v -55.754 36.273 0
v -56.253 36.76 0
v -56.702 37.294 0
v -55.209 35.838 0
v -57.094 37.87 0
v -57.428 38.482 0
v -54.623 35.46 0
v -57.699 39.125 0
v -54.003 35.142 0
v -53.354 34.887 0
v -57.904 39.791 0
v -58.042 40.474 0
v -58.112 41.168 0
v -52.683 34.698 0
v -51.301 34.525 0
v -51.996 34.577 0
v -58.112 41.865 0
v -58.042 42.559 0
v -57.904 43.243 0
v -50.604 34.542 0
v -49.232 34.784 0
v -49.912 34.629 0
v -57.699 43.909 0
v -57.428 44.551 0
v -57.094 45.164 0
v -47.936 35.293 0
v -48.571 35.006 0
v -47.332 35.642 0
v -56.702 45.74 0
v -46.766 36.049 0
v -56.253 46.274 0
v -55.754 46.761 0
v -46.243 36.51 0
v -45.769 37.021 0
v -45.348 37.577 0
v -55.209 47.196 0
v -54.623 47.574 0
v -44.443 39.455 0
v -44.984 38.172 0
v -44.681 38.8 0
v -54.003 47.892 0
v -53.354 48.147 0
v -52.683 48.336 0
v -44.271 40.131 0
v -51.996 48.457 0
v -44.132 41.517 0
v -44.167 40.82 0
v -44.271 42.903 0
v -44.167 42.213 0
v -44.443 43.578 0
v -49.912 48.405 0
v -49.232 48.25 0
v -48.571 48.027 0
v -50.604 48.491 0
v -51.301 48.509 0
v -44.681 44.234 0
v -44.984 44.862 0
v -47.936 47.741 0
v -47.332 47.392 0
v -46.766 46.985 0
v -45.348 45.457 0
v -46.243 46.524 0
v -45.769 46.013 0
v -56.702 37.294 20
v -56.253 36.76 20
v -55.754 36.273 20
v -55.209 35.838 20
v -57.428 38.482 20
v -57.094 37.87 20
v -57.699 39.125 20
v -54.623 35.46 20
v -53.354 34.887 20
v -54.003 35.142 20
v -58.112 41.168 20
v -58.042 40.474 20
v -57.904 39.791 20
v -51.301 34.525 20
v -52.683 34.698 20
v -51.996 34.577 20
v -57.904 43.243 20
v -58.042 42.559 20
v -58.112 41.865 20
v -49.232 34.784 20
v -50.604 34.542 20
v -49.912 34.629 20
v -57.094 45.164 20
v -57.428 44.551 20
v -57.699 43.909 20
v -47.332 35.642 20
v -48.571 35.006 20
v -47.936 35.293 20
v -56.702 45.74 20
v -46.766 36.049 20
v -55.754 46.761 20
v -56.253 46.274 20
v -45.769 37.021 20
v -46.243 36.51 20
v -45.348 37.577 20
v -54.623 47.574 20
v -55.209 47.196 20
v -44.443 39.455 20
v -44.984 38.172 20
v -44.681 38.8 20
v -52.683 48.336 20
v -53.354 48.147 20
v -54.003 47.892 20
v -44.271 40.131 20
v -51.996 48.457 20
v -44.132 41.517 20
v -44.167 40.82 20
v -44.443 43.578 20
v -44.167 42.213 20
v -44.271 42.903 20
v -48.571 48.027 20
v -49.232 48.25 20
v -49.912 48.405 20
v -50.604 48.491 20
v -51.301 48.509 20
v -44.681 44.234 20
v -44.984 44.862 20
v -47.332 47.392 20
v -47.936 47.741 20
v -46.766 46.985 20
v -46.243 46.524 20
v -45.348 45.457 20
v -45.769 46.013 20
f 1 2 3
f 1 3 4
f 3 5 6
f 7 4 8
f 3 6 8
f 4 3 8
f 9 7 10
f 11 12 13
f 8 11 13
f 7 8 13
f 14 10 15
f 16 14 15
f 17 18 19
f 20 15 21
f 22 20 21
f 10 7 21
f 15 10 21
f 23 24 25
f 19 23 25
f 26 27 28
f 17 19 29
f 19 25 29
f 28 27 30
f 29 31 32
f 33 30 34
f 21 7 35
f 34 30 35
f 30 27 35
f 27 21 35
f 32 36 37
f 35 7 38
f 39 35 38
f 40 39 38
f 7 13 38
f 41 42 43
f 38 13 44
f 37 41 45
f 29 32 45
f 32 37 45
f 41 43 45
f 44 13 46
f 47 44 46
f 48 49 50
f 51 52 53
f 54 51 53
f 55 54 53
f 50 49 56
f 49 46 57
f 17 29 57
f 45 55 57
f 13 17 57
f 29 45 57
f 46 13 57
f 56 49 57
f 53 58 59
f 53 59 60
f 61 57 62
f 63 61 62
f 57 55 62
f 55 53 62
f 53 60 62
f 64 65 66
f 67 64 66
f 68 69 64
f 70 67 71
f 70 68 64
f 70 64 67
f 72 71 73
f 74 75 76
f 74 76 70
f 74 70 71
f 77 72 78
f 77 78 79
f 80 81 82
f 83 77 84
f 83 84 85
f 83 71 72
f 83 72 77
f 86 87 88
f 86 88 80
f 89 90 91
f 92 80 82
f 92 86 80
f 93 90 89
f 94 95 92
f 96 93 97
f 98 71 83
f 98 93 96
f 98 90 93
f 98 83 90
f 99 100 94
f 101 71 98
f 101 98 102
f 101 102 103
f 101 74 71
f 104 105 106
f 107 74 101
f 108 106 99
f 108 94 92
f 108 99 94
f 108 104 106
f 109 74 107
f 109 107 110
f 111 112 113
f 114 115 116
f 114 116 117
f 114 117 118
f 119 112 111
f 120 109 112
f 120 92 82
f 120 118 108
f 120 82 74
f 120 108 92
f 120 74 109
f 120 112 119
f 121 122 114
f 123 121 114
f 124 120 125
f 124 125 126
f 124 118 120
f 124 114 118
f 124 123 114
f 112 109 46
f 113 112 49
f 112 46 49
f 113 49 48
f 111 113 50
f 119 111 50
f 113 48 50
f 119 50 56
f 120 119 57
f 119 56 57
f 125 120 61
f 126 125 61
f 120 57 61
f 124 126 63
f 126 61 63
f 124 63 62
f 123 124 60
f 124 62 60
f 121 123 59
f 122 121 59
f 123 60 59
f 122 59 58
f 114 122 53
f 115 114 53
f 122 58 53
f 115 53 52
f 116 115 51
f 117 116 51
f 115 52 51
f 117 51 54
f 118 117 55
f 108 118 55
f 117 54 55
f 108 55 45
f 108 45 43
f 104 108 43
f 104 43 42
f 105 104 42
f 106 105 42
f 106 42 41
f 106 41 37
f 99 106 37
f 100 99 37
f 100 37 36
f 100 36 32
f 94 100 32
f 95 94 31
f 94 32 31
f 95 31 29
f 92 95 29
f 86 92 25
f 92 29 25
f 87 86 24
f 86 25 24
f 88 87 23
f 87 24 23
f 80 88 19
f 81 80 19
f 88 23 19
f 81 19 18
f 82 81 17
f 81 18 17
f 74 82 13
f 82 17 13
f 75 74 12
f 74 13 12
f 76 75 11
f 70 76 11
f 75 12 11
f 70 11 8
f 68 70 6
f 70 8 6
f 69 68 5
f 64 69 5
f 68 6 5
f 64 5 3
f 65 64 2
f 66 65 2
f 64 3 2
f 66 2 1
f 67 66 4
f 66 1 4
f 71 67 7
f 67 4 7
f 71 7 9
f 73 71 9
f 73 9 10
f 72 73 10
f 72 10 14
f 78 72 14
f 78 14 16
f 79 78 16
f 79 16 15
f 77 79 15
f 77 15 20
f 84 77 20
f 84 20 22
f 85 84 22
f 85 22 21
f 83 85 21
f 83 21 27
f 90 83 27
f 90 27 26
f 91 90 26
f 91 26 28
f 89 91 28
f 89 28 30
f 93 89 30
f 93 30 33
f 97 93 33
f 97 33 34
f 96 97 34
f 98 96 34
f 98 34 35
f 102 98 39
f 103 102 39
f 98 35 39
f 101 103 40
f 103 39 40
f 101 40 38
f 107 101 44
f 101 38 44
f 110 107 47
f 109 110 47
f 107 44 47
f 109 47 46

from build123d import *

# Parameters (mm, degrees)
SKETCH1_W             = 128.922622712
SKETCH1_H             = 108.547542538
SKETCH1_W_2           = 124.922622712
SKETCH1_H_2           = 104.547542538
BOSS_EXTRUDE1_DEPTH   = 50
SKETCH2_R             = 48.496570744
BOSS_EXTRUDE2_DEPTH   = 50
SKETCH3_R             = 6.994110628
BOSS_EXTRUDE3_DEPTH   = 20
SKETCH3_R_2           = 6.120691225
BOSS_EXTRUDE3_2_DEPTH = 20


with BuildPart() as part:
    # Sketch1 → Boss-Extrude1 (new body)
    with BuildSketch(Plane.XY):
        Rectangle(SKETCH1_W, SKETCH1_H)
        Rectangle(SKETCH1_W_2, SKETCH1_H_2, mode=Mode.SUBTRACT)
    extrude(amount=BOSS_EXTRUDE1_DEPTH)


with BuildPart() as body_2:
    # Sketch2 → Boss-Extrude2 (new body)
    with BuildSketch(Plane.XY):
        with Locations(Location((0, 0, 0), (0, 0, 180))):
            Circle(SKETCH2_R)
    extrude(amount=BOSS_EXTRUDE2_DEPTH)


with BuildPart() as body_3:
    # Sketch3 → Boss-Extrude3 (new body)
    with BuildSketch(Plane.XY):
        with Locations((-51.126362865, 41.516845757)):
            Circle(SKETCH3_R)
    extrude(amount=BOSS_EXTRUDE3_DEPTH)


with BuildPart() as body_4:
    # Sketch3 → Boss-Extrude3 2 (new body)
    with BuildSketch(Plane.XY):
        with Locations((46.461548735, 43.755956539)):
            Circle(SKETCH3_R_2)
    extrude(amount=BOSS_EXTRUDE3_2_DEPTH)


solid = body_3.part
